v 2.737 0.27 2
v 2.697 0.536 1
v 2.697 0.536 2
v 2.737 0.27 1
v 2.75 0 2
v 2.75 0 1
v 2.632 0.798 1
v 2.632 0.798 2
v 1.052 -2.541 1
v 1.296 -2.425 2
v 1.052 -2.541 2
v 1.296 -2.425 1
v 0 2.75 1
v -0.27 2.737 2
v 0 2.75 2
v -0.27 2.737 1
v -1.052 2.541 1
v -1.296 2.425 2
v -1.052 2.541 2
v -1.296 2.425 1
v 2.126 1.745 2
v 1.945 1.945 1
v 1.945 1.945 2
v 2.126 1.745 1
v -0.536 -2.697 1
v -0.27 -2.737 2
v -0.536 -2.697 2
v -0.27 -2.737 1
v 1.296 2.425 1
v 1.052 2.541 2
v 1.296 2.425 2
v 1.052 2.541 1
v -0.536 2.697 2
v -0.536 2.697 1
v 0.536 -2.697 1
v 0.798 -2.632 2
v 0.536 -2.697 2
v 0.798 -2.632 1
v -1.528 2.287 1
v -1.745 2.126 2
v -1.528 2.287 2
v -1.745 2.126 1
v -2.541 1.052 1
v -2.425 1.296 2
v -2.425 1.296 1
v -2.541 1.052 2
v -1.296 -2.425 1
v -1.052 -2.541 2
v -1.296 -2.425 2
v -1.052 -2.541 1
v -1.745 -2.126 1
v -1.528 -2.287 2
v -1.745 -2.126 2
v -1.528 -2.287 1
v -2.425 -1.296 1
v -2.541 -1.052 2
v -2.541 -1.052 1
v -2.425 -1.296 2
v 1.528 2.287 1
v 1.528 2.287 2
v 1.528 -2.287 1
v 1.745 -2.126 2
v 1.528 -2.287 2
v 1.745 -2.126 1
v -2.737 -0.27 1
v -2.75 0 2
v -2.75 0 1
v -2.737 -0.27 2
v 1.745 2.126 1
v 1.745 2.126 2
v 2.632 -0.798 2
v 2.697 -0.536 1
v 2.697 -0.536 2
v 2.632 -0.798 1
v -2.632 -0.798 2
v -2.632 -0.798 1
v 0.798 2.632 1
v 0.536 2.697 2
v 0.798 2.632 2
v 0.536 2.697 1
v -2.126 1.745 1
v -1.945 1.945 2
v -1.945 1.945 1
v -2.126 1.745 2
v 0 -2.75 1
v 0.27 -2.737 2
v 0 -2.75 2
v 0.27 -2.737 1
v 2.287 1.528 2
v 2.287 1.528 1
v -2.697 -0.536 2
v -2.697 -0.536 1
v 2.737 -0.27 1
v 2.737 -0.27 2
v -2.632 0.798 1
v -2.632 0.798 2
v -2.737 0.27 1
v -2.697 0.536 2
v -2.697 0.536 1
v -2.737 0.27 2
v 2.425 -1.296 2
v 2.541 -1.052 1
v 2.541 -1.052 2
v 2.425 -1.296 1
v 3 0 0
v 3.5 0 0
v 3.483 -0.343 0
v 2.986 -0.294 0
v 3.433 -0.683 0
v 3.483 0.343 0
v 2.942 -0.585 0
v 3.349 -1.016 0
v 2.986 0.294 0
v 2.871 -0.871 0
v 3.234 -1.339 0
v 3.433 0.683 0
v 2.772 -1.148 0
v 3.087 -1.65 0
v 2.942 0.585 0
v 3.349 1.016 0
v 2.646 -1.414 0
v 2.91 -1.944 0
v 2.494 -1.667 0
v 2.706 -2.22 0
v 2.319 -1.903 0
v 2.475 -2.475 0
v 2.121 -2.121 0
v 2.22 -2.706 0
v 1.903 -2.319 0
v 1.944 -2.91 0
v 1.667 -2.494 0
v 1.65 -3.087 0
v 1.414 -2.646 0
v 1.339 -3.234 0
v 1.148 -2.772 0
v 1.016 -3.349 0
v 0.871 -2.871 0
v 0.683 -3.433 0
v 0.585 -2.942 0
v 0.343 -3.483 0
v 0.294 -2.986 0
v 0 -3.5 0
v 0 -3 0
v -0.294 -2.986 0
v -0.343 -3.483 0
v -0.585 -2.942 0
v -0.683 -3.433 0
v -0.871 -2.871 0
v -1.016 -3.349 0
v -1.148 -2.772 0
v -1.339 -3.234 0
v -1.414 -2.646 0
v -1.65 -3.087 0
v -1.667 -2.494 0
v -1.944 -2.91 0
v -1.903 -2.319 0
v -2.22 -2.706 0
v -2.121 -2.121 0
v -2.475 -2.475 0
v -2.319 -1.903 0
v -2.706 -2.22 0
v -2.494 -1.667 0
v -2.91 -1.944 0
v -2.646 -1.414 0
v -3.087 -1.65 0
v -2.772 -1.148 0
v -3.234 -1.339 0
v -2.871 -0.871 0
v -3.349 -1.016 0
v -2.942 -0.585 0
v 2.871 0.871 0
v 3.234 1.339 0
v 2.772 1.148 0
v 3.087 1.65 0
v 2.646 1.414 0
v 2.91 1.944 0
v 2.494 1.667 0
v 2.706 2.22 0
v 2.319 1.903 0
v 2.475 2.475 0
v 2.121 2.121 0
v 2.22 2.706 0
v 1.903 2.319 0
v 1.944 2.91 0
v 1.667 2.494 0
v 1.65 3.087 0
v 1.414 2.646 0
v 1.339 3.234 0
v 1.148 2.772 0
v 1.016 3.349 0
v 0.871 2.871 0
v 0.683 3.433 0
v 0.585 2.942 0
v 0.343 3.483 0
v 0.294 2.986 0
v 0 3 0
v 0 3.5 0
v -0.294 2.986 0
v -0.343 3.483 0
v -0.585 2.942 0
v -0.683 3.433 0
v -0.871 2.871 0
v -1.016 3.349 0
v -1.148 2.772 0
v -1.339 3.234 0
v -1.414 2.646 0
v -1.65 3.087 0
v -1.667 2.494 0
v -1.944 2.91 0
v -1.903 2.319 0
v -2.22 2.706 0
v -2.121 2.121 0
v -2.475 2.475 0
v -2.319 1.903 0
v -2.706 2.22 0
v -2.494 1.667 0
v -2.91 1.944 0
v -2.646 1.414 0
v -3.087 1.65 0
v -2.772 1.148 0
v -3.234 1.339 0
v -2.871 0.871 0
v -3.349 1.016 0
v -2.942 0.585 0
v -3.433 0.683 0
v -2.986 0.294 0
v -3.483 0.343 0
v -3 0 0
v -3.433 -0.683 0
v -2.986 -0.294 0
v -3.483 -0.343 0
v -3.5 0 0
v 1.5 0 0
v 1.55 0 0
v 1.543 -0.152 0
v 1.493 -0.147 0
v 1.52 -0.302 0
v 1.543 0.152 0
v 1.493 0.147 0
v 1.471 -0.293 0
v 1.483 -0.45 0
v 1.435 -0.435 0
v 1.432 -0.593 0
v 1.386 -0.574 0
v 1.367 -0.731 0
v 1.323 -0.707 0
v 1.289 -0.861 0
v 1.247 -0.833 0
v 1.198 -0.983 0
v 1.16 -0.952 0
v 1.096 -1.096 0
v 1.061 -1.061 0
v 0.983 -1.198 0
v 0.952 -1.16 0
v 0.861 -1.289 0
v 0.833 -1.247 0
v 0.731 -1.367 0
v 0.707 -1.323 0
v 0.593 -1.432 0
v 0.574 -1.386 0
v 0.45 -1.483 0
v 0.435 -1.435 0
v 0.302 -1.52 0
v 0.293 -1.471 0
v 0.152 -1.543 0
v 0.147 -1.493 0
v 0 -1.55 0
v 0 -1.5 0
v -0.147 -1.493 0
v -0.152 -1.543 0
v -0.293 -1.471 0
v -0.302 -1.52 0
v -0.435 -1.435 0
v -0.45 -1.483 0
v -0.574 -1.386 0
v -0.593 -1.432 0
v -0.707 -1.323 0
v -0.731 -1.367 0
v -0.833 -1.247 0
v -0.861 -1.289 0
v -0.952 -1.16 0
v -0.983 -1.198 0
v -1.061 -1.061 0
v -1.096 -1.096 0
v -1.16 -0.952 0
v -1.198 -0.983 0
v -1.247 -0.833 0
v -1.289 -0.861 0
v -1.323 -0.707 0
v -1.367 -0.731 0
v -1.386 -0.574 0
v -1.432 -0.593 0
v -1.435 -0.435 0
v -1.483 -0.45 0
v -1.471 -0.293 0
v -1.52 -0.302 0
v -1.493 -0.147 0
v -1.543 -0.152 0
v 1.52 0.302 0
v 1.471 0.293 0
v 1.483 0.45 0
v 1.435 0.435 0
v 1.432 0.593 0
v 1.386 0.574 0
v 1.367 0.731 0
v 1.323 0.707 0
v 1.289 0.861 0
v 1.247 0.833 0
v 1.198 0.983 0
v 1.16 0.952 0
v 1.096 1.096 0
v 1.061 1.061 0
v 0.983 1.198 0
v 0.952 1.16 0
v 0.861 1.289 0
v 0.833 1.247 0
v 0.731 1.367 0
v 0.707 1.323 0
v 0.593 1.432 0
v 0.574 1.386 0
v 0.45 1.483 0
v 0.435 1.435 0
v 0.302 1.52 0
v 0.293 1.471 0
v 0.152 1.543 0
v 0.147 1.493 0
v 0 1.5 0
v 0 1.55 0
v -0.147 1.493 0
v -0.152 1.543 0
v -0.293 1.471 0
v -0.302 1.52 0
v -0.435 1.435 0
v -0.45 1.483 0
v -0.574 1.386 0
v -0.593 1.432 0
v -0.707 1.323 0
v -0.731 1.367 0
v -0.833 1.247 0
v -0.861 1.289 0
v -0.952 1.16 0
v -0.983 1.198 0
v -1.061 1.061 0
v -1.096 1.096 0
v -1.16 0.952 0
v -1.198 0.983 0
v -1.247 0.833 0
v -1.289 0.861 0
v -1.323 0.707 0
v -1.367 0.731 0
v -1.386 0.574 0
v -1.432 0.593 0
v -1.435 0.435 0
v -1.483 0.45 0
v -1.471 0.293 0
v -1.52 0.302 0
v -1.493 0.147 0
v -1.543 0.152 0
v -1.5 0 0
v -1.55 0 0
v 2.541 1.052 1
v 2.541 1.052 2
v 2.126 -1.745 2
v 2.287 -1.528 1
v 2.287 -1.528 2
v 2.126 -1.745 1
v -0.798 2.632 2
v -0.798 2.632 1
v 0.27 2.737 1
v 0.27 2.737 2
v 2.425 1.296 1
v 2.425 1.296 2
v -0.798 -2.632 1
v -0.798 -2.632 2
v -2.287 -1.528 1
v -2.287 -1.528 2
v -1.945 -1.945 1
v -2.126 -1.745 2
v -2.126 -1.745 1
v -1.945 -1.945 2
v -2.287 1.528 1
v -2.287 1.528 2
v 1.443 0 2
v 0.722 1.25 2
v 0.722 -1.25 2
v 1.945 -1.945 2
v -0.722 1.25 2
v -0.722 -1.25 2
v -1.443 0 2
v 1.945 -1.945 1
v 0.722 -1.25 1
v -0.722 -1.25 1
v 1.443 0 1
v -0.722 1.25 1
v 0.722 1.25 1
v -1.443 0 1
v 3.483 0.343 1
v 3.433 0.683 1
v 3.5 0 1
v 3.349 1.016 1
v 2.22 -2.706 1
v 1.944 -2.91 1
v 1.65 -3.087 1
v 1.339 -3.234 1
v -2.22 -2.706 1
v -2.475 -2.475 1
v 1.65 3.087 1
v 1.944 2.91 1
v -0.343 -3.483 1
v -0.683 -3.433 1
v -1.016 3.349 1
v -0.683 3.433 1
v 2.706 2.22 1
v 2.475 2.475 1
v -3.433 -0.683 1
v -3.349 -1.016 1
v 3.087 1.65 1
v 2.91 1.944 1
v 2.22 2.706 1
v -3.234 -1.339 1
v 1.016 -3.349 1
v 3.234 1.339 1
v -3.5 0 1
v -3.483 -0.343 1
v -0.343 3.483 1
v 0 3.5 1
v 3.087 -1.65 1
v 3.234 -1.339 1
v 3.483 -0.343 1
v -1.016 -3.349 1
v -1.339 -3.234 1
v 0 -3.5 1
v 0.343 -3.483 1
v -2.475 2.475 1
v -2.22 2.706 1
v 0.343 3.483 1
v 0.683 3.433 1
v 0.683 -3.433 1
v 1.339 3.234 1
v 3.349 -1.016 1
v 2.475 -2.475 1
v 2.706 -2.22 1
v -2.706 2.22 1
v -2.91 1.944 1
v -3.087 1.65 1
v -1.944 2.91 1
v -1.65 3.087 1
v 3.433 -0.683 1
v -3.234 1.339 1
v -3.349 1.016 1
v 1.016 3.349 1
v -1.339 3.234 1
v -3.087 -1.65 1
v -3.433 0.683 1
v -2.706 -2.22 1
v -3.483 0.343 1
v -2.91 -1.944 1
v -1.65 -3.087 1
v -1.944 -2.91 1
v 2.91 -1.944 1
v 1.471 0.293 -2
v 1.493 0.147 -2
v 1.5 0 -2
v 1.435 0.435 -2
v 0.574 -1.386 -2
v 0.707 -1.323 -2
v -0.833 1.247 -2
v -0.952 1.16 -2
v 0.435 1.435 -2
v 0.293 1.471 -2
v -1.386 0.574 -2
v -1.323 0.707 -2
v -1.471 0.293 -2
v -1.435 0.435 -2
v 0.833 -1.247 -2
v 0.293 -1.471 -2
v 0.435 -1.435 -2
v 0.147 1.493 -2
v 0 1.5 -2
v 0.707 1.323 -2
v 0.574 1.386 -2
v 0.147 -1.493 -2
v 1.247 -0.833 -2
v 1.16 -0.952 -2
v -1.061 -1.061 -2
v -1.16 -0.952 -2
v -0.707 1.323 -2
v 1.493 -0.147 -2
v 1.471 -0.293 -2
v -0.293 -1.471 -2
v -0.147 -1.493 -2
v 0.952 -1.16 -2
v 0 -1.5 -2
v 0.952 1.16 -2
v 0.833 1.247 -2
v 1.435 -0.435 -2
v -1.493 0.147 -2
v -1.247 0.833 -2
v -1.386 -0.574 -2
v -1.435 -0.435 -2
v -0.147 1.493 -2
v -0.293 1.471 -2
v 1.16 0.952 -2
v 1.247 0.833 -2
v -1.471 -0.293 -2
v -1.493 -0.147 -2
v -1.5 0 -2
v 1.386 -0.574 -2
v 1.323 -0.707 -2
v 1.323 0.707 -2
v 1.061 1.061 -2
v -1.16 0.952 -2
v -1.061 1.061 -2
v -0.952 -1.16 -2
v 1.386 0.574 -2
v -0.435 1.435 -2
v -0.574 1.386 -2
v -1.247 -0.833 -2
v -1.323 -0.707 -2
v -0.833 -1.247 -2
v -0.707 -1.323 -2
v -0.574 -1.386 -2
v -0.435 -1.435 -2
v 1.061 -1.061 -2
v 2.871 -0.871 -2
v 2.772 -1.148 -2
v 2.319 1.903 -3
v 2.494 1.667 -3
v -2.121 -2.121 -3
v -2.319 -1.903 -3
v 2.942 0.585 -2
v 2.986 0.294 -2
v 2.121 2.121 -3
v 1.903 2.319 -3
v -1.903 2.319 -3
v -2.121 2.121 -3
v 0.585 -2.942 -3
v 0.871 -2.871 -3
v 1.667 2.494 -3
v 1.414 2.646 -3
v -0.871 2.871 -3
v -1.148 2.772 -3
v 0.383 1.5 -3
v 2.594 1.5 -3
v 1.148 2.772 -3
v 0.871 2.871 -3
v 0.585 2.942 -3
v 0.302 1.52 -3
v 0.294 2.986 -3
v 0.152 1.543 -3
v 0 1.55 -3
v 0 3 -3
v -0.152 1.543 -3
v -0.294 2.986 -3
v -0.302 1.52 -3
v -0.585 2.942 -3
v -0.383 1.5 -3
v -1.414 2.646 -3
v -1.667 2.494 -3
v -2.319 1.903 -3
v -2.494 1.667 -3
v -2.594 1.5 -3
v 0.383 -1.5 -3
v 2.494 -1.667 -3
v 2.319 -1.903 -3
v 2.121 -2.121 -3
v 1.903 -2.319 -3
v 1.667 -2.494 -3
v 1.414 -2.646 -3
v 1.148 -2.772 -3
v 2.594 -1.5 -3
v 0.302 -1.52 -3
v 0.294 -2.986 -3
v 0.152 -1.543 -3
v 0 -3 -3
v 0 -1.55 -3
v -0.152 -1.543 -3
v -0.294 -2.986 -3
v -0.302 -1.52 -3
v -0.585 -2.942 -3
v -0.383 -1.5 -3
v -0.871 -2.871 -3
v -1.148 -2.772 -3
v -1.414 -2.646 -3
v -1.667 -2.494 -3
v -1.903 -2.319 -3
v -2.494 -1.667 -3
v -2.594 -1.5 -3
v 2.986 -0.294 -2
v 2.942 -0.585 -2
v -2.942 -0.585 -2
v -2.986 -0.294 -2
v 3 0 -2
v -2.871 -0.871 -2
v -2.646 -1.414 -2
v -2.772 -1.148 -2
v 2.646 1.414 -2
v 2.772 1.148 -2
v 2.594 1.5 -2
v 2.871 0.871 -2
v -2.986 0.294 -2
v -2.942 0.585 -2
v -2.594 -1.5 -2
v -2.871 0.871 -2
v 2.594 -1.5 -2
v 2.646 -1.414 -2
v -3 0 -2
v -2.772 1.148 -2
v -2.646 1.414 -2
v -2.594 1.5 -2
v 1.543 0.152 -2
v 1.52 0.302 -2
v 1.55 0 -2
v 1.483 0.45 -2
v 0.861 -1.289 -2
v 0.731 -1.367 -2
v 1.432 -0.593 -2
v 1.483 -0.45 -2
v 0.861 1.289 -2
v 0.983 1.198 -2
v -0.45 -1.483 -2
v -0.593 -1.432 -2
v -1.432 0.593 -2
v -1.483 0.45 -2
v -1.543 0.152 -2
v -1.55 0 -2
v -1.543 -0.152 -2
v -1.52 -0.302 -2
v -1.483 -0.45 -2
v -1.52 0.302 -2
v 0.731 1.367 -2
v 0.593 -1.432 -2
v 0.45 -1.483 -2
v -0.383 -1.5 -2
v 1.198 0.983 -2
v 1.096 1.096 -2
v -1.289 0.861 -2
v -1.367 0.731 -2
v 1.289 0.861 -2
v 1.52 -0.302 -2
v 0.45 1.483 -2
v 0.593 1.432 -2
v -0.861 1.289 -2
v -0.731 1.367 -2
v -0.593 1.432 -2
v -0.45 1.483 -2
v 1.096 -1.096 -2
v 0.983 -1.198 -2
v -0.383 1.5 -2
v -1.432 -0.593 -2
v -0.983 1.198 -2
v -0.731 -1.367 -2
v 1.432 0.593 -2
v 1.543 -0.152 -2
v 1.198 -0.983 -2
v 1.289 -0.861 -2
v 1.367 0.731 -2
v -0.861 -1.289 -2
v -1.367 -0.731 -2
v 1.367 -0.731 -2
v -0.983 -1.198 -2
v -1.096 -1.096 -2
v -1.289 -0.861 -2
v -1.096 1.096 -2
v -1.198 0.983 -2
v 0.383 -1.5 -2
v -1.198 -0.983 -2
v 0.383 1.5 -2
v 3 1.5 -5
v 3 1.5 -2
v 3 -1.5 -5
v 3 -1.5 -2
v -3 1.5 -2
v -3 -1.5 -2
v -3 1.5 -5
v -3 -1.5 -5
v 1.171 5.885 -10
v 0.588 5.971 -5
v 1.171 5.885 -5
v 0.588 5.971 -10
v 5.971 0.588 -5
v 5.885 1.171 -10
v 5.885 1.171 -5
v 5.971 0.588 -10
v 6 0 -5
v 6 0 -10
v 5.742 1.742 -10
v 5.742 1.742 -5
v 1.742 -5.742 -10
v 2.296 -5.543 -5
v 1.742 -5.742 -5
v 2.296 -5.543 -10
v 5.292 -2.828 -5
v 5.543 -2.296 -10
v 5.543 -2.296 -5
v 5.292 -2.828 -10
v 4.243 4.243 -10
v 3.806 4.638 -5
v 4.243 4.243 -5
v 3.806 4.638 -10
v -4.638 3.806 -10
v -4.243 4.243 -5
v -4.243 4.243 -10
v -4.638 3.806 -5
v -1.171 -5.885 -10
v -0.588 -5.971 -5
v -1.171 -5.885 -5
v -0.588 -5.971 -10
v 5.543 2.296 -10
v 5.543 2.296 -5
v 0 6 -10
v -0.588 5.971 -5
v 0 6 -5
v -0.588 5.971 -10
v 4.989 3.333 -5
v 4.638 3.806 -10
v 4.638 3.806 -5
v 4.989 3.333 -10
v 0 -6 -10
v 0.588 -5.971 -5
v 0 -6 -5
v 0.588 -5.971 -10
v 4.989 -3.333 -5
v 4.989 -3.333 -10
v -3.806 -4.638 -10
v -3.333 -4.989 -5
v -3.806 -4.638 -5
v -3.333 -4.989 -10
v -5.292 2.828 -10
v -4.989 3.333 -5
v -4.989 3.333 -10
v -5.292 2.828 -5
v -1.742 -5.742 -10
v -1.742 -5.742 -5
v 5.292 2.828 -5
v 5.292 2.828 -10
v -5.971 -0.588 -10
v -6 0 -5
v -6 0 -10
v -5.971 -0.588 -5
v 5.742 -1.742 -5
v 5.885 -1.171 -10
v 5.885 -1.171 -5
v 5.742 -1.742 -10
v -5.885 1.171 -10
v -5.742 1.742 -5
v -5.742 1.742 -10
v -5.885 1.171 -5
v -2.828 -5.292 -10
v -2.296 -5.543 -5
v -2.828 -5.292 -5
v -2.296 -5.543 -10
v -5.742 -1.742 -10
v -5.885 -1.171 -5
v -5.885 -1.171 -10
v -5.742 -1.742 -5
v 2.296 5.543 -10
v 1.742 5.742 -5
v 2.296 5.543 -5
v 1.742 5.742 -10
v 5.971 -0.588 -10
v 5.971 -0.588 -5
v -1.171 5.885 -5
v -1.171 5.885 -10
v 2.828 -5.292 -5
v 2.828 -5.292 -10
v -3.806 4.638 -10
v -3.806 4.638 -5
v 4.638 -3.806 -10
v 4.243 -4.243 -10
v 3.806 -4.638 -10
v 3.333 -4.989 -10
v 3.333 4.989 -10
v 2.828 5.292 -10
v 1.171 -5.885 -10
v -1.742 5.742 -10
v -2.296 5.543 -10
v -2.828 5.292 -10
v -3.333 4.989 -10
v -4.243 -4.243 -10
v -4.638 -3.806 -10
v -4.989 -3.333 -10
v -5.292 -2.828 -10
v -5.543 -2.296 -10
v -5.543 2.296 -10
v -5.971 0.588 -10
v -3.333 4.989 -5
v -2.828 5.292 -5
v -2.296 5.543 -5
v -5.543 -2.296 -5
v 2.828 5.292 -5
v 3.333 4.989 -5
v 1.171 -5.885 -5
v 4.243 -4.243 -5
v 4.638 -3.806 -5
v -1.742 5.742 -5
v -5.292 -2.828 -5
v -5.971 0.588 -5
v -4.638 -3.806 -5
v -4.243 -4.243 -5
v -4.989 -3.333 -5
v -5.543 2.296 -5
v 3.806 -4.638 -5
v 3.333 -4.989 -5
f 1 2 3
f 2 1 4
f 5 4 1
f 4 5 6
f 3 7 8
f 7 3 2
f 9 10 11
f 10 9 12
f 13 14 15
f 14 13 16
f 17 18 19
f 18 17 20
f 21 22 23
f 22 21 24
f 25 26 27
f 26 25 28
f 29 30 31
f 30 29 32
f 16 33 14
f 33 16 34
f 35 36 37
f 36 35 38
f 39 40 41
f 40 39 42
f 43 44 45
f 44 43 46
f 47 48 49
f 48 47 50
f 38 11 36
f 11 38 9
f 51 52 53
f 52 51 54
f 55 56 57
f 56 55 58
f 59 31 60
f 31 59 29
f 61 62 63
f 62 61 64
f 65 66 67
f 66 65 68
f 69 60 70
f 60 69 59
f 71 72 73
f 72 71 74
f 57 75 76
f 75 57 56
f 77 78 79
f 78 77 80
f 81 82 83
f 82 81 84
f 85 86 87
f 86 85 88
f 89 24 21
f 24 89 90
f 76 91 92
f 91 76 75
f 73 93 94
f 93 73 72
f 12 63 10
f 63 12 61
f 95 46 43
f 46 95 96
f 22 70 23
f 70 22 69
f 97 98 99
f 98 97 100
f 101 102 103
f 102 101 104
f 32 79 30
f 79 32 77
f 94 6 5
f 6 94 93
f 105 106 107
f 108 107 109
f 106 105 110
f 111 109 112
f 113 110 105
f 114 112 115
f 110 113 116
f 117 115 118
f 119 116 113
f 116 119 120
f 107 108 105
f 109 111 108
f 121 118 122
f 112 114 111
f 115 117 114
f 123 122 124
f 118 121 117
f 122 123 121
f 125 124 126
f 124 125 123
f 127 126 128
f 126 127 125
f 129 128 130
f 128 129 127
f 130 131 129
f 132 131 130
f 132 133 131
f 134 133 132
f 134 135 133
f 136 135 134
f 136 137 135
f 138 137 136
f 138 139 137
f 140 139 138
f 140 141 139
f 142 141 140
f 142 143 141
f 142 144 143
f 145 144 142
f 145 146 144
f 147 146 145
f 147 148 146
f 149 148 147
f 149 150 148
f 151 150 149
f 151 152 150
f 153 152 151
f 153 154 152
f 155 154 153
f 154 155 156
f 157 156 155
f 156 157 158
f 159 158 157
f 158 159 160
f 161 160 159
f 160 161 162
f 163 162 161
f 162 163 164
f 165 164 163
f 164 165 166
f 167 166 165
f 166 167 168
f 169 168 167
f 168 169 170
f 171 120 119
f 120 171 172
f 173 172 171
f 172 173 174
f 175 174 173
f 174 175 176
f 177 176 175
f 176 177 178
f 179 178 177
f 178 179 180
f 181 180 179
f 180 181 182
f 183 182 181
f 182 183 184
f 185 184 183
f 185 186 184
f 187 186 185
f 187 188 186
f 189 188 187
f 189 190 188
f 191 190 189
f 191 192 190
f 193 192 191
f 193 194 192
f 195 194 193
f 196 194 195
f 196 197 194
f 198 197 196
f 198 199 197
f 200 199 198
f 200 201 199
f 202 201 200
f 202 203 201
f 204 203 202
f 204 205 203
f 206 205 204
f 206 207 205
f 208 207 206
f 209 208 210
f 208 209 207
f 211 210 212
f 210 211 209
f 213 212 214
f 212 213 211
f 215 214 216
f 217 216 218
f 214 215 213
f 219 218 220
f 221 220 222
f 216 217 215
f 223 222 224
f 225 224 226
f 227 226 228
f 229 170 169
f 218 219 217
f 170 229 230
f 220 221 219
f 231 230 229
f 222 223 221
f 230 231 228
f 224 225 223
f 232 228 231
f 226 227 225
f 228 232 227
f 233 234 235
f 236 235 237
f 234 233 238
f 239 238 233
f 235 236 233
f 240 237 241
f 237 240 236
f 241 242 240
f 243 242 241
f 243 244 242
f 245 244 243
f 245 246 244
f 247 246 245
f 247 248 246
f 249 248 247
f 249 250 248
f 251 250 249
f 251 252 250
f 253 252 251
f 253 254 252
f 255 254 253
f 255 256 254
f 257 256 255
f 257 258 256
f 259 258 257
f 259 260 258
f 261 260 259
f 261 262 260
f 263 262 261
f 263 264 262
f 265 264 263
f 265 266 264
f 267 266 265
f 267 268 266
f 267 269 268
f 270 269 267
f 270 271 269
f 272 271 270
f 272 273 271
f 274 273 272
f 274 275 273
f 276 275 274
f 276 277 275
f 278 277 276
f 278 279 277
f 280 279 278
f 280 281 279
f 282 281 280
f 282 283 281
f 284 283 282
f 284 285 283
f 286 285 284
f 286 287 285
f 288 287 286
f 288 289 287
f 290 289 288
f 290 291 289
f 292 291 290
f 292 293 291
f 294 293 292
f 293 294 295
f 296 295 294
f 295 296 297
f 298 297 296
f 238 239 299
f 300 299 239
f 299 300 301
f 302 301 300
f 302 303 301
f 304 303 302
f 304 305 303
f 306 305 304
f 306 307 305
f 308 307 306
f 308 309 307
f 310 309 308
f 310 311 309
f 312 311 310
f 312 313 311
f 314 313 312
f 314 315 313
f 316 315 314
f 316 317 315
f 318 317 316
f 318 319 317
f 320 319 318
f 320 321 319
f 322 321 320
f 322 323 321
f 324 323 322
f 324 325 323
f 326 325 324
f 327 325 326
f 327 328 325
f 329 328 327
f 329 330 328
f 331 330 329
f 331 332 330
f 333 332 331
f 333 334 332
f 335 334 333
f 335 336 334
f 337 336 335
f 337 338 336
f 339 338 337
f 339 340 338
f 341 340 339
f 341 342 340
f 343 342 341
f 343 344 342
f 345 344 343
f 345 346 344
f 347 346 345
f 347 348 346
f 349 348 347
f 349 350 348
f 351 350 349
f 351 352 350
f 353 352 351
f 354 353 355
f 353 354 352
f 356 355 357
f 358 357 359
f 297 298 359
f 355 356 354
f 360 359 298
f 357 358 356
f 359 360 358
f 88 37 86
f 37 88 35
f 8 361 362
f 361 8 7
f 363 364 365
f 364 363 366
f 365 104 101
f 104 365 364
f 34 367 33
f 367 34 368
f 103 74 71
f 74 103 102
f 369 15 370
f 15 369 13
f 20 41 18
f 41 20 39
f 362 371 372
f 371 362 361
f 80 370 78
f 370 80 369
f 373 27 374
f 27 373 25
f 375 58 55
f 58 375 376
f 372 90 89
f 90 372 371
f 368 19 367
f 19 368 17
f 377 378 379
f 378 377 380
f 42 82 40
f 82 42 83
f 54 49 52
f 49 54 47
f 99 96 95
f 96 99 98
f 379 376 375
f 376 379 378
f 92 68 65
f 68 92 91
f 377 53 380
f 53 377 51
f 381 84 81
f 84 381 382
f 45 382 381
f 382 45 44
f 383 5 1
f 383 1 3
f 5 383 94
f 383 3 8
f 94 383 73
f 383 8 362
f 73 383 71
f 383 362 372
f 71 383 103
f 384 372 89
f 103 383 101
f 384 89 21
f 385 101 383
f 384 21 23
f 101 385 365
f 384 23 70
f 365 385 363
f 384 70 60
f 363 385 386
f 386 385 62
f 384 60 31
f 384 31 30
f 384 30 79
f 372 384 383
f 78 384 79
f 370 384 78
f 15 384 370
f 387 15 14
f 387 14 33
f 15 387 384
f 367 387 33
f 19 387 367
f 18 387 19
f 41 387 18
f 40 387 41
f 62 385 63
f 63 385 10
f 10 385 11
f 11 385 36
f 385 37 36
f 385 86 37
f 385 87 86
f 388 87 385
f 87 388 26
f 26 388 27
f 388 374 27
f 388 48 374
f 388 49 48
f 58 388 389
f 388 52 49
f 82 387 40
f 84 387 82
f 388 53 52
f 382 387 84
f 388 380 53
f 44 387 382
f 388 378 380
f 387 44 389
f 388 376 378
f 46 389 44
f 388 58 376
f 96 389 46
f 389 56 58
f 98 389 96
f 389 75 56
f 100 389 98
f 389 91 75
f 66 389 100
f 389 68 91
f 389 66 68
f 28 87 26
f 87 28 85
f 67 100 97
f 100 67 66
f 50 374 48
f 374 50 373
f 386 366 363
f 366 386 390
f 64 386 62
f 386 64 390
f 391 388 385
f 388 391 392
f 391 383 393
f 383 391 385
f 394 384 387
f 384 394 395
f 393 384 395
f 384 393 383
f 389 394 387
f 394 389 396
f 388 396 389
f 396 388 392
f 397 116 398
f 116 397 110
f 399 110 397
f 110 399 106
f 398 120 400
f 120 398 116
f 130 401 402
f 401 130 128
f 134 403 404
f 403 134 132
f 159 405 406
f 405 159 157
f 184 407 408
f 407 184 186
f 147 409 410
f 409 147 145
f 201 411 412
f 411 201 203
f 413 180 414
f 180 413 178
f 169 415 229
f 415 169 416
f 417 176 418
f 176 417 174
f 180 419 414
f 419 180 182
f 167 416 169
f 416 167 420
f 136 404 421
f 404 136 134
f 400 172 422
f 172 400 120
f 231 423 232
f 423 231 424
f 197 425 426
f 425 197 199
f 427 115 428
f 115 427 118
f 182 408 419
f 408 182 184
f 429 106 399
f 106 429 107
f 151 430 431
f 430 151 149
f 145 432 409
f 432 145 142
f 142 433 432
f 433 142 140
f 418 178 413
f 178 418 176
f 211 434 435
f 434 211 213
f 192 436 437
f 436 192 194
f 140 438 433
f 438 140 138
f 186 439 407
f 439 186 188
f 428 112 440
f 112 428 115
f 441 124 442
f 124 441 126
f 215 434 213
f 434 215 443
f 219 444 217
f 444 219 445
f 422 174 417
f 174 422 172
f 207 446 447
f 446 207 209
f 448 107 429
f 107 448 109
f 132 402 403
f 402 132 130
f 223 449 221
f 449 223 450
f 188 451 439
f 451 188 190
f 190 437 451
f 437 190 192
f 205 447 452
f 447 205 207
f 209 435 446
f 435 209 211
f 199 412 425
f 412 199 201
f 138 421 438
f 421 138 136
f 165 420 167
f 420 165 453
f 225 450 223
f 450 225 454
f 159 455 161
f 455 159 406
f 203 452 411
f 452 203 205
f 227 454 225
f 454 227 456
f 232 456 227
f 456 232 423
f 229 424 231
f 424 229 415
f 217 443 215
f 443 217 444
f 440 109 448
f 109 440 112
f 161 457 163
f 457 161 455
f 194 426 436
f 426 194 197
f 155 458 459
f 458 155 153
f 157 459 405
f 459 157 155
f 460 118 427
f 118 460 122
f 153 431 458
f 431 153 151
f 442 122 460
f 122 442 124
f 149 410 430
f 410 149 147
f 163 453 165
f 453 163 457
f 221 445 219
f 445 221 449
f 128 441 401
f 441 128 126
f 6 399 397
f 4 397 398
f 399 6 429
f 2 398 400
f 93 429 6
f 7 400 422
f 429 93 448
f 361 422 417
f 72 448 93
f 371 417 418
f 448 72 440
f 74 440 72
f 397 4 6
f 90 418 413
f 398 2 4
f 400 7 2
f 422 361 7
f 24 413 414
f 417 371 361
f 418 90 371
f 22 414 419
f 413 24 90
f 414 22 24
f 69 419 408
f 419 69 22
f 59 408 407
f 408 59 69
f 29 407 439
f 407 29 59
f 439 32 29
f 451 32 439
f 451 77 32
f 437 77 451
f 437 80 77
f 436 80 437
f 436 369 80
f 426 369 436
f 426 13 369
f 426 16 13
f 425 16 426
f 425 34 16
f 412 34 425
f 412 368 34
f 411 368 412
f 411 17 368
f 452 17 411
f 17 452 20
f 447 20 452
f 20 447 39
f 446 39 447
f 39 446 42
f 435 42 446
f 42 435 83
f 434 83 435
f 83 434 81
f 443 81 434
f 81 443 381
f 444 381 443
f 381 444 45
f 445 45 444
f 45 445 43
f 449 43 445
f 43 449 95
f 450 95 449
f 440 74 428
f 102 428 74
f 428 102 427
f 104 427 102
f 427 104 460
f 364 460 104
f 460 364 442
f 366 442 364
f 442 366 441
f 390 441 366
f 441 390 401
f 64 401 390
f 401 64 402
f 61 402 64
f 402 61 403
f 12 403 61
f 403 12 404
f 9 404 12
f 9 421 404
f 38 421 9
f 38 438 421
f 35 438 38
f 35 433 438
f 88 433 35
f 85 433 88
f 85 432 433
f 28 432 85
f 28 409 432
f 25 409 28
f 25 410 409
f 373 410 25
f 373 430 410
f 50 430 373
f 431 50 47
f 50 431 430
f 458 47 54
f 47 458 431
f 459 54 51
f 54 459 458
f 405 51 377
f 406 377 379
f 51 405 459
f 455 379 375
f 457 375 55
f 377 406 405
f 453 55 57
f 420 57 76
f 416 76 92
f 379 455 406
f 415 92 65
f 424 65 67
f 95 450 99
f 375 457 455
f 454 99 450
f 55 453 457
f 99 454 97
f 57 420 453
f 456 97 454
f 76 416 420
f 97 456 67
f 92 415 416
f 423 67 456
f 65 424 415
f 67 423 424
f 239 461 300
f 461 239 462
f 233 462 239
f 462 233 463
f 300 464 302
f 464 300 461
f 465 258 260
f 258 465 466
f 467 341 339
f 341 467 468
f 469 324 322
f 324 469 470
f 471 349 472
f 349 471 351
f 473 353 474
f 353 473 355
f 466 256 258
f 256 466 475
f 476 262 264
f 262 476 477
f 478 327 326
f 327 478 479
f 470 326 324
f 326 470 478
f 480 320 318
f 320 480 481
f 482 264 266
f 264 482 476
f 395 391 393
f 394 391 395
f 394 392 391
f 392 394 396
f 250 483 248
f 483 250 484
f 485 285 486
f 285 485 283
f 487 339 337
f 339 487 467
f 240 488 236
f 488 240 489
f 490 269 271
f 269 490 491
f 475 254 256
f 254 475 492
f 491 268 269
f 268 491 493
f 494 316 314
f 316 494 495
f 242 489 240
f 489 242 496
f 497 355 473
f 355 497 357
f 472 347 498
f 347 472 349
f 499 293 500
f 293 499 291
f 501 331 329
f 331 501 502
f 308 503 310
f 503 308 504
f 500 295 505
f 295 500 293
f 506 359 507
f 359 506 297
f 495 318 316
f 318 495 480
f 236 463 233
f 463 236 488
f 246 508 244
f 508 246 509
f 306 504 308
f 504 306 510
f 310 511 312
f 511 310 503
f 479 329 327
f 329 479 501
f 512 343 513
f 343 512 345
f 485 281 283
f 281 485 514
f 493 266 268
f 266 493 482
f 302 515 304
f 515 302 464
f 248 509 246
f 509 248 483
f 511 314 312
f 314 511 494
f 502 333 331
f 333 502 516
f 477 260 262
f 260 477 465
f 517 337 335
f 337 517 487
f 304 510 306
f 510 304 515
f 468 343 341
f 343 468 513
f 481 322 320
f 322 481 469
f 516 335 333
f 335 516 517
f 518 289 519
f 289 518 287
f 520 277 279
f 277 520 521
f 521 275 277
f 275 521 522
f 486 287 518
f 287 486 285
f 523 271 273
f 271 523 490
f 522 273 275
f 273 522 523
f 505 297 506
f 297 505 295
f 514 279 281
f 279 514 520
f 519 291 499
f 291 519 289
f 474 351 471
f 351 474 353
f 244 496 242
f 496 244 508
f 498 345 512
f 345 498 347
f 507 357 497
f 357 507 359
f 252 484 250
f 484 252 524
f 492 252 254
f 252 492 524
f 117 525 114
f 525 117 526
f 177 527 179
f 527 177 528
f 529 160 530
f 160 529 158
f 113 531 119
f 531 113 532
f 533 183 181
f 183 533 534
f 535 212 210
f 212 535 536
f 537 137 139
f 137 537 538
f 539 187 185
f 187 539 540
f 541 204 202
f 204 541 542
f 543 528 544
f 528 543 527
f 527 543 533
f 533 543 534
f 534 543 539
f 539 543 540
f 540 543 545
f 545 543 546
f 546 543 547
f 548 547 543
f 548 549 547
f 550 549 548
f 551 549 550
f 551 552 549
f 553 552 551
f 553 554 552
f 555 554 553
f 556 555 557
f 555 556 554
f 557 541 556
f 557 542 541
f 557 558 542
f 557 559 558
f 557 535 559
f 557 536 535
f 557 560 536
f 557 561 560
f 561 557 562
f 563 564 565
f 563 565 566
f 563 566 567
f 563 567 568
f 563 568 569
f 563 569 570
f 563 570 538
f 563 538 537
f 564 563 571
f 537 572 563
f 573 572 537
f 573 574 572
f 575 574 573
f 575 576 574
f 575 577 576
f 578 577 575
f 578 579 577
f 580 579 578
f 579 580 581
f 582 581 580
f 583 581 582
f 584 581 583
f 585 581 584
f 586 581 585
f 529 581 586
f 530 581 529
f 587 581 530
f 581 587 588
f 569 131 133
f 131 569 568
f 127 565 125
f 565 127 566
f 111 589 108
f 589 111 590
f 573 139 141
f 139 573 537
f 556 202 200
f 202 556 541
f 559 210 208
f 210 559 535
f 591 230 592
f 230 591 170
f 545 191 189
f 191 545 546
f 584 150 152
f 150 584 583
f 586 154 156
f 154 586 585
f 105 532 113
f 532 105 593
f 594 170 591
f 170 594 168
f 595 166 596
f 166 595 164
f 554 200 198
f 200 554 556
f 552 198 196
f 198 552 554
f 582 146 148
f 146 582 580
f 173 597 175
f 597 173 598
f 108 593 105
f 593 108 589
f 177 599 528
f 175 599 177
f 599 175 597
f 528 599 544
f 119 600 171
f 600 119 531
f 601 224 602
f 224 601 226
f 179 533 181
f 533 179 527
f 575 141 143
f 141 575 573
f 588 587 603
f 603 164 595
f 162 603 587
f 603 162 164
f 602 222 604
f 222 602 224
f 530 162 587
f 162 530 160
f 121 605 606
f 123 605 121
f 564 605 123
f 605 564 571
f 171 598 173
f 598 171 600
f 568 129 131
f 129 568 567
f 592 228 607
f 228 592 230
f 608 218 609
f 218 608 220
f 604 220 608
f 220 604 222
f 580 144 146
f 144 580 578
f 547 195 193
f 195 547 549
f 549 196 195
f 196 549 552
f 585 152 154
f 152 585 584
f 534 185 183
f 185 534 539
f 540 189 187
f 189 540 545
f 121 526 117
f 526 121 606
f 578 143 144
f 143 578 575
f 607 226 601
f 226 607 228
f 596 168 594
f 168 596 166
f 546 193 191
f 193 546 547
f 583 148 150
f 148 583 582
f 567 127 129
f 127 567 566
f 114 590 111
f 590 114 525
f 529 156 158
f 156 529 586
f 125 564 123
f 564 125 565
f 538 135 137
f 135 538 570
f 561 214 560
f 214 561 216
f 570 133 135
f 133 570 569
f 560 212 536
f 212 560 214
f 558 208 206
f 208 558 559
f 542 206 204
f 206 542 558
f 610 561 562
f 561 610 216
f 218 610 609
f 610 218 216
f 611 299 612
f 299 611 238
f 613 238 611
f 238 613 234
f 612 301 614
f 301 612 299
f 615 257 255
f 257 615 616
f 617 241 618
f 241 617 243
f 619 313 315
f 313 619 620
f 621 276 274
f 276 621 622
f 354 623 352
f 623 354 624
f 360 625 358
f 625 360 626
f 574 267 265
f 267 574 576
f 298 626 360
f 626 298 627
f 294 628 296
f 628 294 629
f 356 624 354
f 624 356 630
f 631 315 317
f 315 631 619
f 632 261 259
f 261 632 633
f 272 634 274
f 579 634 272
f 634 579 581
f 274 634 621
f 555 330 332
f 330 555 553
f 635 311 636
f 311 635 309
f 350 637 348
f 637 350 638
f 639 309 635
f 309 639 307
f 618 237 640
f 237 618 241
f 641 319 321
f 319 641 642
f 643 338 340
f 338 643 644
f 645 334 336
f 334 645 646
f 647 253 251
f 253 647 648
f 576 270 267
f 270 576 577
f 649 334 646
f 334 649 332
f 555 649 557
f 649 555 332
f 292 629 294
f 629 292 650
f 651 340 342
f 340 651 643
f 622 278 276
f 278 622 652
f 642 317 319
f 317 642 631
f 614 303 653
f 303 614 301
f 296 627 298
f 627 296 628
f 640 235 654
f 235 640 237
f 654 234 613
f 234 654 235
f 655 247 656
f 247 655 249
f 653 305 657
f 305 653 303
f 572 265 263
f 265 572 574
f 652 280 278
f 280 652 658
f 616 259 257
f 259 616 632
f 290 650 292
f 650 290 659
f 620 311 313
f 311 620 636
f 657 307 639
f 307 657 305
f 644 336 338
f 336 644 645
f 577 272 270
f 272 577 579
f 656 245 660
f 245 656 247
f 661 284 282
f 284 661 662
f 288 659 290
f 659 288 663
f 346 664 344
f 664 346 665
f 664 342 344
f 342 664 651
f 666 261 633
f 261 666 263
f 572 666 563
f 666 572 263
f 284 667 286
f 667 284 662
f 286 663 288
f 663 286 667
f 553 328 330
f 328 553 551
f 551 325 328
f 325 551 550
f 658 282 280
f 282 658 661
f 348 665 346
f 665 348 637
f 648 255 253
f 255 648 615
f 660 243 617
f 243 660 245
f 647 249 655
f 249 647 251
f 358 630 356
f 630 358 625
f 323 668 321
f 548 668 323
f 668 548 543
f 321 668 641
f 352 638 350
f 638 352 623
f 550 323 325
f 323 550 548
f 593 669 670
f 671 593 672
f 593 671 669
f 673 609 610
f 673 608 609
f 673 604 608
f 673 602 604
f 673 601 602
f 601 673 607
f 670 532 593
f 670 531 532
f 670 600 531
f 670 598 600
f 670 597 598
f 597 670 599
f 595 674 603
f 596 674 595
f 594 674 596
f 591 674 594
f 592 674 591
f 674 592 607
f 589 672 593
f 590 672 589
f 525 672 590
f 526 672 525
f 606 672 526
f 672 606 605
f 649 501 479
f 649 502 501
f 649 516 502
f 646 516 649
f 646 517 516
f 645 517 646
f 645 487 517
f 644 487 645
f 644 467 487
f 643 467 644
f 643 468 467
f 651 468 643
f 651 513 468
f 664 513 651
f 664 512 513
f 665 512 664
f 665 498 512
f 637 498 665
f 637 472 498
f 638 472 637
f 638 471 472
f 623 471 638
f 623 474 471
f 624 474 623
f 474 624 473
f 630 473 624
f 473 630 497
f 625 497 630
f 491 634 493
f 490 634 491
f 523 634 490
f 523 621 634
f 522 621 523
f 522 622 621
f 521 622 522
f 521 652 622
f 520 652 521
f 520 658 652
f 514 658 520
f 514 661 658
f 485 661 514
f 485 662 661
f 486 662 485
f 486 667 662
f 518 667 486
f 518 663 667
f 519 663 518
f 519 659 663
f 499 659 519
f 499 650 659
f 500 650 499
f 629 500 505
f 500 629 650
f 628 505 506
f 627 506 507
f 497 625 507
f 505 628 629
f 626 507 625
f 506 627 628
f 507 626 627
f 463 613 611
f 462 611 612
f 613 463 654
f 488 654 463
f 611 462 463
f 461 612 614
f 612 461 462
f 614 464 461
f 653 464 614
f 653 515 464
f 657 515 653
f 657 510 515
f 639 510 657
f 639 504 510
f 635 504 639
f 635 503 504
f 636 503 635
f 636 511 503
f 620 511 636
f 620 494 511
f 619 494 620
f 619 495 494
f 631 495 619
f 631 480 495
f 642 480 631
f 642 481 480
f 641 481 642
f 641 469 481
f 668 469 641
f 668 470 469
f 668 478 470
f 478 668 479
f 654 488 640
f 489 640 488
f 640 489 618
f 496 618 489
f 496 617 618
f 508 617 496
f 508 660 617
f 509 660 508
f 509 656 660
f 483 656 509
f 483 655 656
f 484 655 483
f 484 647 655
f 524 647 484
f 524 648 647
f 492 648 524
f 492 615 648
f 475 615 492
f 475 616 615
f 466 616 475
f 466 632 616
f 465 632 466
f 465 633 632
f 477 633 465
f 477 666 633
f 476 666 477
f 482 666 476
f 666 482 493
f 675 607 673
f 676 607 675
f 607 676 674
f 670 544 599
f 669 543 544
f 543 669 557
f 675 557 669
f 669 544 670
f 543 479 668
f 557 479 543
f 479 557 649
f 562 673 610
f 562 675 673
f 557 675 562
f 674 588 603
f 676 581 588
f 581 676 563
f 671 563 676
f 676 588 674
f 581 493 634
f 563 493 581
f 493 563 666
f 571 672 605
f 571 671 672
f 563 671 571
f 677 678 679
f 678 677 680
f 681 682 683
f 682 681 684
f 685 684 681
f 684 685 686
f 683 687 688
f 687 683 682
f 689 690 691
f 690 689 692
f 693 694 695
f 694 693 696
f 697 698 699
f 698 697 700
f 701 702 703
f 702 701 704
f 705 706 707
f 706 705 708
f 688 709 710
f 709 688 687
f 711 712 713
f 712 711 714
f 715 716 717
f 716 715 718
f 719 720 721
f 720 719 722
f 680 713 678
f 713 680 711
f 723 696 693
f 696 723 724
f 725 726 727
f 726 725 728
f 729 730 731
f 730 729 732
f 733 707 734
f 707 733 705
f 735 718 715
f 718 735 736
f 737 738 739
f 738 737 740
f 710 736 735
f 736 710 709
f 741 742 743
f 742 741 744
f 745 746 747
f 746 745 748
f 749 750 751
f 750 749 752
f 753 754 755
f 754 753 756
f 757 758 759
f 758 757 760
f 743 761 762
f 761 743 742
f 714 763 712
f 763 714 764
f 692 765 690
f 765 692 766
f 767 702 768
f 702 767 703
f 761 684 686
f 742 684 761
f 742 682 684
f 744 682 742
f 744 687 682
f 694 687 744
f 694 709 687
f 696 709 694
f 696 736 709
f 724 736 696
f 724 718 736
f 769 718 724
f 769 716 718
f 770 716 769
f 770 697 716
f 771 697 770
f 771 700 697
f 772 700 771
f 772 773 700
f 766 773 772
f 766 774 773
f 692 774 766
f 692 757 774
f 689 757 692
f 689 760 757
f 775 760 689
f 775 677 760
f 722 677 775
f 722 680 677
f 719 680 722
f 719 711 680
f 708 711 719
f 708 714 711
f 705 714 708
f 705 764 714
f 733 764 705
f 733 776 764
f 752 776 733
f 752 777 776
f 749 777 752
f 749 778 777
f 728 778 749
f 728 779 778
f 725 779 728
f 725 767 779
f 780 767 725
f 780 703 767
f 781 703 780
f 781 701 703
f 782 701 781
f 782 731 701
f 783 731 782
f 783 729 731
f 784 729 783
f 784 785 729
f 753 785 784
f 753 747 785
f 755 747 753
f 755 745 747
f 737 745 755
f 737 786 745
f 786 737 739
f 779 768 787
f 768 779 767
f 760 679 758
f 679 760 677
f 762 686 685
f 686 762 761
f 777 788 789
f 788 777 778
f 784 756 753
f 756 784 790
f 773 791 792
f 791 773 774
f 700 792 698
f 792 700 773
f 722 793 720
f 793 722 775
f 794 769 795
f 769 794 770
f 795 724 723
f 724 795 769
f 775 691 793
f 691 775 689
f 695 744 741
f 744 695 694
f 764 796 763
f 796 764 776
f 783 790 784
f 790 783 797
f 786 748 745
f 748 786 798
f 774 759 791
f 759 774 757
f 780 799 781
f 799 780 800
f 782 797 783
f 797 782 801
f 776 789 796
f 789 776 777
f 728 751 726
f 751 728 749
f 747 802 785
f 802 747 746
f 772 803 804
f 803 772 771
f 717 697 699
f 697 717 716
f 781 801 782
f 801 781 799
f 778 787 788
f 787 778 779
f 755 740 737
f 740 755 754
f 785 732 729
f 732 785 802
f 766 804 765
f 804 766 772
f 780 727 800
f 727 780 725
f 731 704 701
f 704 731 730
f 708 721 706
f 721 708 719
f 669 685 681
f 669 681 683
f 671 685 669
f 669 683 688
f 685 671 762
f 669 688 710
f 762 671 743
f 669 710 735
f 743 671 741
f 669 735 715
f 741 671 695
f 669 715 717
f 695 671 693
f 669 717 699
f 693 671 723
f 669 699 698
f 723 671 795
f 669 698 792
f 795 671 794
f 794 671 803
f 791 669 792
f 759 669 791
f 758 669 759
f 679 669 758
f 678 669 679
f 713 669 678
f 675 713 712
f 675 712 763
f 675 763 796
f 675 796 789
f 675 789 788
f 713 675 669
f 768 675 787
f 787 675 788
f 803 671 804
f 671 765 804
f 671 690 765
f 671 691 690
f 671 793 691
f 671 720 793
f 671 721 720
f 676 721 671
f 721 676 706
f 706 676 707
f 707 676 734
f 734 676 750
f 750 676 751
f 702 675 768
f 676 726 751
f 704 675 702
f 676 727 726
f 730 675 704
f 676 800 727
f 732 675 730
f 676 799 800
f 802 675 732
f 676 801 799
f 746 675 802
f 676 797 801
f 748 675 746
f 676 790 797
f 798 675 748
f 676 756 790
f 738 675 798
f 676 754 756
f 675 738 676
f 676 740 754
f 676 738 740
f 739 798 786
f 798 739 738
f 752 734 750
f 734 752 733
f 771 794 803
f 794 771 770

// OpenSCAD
// Parameters
shank_diameter_mm = 3; //[1.5:6:0.1]
length_under_head_mm = 10; //[5:20:0.5]
head_diameter_mm = 5.5; //[3:11:0.1]
head_height_mm = 2; //[1:4:0.1]
socket_across_flats_mm = 2.5; //[1.5:4:0.1]
socket_depth_mm = 1.5; //[0.8:2.5:0.1]
thread_coverage_ratio = 1; //[0.3:1:0.05]
thread_major_diameter_mm = 3; //[1.5:6:0.1]
thread_minor_diameter_mm = 2.7; //[1.2:5.5:0.1]
overlap_mm = 1; //[0.5:2:0.1]
washer_outer_diameter_mm = 7; //[4:14:0.1]
washer_thickness_mm = 1; //[0.5:2:0.1]
pcb_spacer_outer_diameter_mm = 6; //[3:12:0.1]
pcb_spacer_height_mm = 4; //[2:10:0.5]
pin_socket_body_length_mm = 6; //[3:15:0.5]
pin_socket_body_width_mm = 3; //[2:8:0.5]
pin_socket_body_height_mm = 4; //[2:10:0.5]
buzzer_radius_mm = 6; //[3:15:0.5]
buzzer_height_mm = 5; //[2:12:0.5]

// Derived Z reference planes (Z+ up)
// Put the underside of the head at Z=0 so everything stacks downward.
z_head_bottom = 0;
z_head_top    = z_head_bottom + head_height_mm;

// Washer sits directly under head with slight overlap into head
z_washer_top    = z_head_bottom + overlap_mm;
z_washer_bottom = z_washer_top - washer_thickness_mm;

// Shank starts under head and runs down; overlap into head to guarantee connection
z_shank_top    = z_head_bottom + overlap_mm;
z_shank_bottom = z_shank_top - length_under_head_mm;

// PCB spacer under washer with overlap
z_spacer_top    = z_washer_bottom + overlap_mm;
z_spacer_bottom = z_spacer_top - pcb_spacer_height_mm;

// Pin socket under spacer with overlap
z_pin_top    = z_spacer_bottom + overlap_mm;
z_pin_bottom = z_pin_top - pin_socket_body_height_mm;

// Buzzer under pin socket with overlap
z_buzzer_top    = z_pin_bottom + overlap_mm;
z_buzzer_bottom = z_buzzer_top - buzzer_height_mm;

// Screw and Washer - connected geometry
module screw_and_washer() {
  color("DimGray")
  union() {
    // Cap head with hex socket cut
    difference() {
      translate([0, 0, (z_head_bottom + z_head_top)/2])
        cylinder(r=head_diameter_mm/2, h=head_height_mm, center=true, $fn=64);

      // Hex socket: referenced from head top, cut downward
      translate([0, 0, z_head_top - socket_depth_mm/2])
        cylinder(r=(socket_across_flats_mm/cos(30))/2, h=socket_depth_mm, center=true, $fn=6);
    }

    // Washer (ring) directly under head, overlapping into head by overlap_mm
    translate([0, 0, (z_washer_bottom + z_washer_top)/2])
      difference() {
        cylinder(r=washer_outer_diameter_mm/2, h=washer_thickness_mm, center=true, $fn=64);
        // Slightly larger hole to avoid coincident faces; does not affect connectivity
        cylinder(r=shank_diameter_mm/2 + 0.05, h=washer_thickness_mm + 0.2, center=true, $fn=64);
      }

    // Shank (single continuous cylinder; thread section is represented by same major diameter)
    translate([0, 0, (z_shank_bottom + z_shank_top)/2])
      cylinder(r=shank_diameter_mm/2, h=length_under_head_mm, center=true, $fn=64);

    // Optional "threaded section" visual (same axis) — overlap ensured by same placement
    // Kept for design parity; it is fully coincident/overlapping with shank so it cannot float.
    translate([0, 0, (z_shank_bottom + z_shank_top)/2])
      cylinder(r=thread_major_diameter_mm/2, h=length_under_head_mm*thread_coverage_ratio, center=true, $fn=64);
  }
}

// PCB Spacer - connected to washer via overlap
module pcb_spacer() {
  color("Silver")
  translate([0, 0, (z_spacer_bottom + z_spacer_top)/2])
    difference() {
      cylinder(r=pcb_spacer_outer_diameter_mm/2, h=pcb_spacer_height_mm, center=true, $fn=64);
      cylinder(r=shank_diameter_mm/2 + 0.05, h=pcb_spacer_height_mm + 0.2, center=true, $fn=64);
    }
}

// Pin Socket - connected to spacer via overlap
module pin_socket() {
  color("Black")
  translate([0, 0, (z_pin_bottom + z_pin_top)/2])
    cube([pin_socket_body_length_mm, pin_socket_body_width_mm, pin_socket_body_height_mm], center=true);
}

// Buzzer - connected to pin socket via overlap
module buzzer() {
  color("DarkSlateGray")
  translate([0, 0, (z_buzzer_bottom + z_buzzer_top)/2])
    cylinder(r=buzzer_radius_mm, h=buzzer_height_mm, center=true, $fn=64);
}

// Assembly: single connected solid (union) with all overlaps enforced
module assembly() {
  union() {
    screw_and_washer();
    pcb_spacer();
    pin_socket();
    buzzer();
  }
}

assembly();
